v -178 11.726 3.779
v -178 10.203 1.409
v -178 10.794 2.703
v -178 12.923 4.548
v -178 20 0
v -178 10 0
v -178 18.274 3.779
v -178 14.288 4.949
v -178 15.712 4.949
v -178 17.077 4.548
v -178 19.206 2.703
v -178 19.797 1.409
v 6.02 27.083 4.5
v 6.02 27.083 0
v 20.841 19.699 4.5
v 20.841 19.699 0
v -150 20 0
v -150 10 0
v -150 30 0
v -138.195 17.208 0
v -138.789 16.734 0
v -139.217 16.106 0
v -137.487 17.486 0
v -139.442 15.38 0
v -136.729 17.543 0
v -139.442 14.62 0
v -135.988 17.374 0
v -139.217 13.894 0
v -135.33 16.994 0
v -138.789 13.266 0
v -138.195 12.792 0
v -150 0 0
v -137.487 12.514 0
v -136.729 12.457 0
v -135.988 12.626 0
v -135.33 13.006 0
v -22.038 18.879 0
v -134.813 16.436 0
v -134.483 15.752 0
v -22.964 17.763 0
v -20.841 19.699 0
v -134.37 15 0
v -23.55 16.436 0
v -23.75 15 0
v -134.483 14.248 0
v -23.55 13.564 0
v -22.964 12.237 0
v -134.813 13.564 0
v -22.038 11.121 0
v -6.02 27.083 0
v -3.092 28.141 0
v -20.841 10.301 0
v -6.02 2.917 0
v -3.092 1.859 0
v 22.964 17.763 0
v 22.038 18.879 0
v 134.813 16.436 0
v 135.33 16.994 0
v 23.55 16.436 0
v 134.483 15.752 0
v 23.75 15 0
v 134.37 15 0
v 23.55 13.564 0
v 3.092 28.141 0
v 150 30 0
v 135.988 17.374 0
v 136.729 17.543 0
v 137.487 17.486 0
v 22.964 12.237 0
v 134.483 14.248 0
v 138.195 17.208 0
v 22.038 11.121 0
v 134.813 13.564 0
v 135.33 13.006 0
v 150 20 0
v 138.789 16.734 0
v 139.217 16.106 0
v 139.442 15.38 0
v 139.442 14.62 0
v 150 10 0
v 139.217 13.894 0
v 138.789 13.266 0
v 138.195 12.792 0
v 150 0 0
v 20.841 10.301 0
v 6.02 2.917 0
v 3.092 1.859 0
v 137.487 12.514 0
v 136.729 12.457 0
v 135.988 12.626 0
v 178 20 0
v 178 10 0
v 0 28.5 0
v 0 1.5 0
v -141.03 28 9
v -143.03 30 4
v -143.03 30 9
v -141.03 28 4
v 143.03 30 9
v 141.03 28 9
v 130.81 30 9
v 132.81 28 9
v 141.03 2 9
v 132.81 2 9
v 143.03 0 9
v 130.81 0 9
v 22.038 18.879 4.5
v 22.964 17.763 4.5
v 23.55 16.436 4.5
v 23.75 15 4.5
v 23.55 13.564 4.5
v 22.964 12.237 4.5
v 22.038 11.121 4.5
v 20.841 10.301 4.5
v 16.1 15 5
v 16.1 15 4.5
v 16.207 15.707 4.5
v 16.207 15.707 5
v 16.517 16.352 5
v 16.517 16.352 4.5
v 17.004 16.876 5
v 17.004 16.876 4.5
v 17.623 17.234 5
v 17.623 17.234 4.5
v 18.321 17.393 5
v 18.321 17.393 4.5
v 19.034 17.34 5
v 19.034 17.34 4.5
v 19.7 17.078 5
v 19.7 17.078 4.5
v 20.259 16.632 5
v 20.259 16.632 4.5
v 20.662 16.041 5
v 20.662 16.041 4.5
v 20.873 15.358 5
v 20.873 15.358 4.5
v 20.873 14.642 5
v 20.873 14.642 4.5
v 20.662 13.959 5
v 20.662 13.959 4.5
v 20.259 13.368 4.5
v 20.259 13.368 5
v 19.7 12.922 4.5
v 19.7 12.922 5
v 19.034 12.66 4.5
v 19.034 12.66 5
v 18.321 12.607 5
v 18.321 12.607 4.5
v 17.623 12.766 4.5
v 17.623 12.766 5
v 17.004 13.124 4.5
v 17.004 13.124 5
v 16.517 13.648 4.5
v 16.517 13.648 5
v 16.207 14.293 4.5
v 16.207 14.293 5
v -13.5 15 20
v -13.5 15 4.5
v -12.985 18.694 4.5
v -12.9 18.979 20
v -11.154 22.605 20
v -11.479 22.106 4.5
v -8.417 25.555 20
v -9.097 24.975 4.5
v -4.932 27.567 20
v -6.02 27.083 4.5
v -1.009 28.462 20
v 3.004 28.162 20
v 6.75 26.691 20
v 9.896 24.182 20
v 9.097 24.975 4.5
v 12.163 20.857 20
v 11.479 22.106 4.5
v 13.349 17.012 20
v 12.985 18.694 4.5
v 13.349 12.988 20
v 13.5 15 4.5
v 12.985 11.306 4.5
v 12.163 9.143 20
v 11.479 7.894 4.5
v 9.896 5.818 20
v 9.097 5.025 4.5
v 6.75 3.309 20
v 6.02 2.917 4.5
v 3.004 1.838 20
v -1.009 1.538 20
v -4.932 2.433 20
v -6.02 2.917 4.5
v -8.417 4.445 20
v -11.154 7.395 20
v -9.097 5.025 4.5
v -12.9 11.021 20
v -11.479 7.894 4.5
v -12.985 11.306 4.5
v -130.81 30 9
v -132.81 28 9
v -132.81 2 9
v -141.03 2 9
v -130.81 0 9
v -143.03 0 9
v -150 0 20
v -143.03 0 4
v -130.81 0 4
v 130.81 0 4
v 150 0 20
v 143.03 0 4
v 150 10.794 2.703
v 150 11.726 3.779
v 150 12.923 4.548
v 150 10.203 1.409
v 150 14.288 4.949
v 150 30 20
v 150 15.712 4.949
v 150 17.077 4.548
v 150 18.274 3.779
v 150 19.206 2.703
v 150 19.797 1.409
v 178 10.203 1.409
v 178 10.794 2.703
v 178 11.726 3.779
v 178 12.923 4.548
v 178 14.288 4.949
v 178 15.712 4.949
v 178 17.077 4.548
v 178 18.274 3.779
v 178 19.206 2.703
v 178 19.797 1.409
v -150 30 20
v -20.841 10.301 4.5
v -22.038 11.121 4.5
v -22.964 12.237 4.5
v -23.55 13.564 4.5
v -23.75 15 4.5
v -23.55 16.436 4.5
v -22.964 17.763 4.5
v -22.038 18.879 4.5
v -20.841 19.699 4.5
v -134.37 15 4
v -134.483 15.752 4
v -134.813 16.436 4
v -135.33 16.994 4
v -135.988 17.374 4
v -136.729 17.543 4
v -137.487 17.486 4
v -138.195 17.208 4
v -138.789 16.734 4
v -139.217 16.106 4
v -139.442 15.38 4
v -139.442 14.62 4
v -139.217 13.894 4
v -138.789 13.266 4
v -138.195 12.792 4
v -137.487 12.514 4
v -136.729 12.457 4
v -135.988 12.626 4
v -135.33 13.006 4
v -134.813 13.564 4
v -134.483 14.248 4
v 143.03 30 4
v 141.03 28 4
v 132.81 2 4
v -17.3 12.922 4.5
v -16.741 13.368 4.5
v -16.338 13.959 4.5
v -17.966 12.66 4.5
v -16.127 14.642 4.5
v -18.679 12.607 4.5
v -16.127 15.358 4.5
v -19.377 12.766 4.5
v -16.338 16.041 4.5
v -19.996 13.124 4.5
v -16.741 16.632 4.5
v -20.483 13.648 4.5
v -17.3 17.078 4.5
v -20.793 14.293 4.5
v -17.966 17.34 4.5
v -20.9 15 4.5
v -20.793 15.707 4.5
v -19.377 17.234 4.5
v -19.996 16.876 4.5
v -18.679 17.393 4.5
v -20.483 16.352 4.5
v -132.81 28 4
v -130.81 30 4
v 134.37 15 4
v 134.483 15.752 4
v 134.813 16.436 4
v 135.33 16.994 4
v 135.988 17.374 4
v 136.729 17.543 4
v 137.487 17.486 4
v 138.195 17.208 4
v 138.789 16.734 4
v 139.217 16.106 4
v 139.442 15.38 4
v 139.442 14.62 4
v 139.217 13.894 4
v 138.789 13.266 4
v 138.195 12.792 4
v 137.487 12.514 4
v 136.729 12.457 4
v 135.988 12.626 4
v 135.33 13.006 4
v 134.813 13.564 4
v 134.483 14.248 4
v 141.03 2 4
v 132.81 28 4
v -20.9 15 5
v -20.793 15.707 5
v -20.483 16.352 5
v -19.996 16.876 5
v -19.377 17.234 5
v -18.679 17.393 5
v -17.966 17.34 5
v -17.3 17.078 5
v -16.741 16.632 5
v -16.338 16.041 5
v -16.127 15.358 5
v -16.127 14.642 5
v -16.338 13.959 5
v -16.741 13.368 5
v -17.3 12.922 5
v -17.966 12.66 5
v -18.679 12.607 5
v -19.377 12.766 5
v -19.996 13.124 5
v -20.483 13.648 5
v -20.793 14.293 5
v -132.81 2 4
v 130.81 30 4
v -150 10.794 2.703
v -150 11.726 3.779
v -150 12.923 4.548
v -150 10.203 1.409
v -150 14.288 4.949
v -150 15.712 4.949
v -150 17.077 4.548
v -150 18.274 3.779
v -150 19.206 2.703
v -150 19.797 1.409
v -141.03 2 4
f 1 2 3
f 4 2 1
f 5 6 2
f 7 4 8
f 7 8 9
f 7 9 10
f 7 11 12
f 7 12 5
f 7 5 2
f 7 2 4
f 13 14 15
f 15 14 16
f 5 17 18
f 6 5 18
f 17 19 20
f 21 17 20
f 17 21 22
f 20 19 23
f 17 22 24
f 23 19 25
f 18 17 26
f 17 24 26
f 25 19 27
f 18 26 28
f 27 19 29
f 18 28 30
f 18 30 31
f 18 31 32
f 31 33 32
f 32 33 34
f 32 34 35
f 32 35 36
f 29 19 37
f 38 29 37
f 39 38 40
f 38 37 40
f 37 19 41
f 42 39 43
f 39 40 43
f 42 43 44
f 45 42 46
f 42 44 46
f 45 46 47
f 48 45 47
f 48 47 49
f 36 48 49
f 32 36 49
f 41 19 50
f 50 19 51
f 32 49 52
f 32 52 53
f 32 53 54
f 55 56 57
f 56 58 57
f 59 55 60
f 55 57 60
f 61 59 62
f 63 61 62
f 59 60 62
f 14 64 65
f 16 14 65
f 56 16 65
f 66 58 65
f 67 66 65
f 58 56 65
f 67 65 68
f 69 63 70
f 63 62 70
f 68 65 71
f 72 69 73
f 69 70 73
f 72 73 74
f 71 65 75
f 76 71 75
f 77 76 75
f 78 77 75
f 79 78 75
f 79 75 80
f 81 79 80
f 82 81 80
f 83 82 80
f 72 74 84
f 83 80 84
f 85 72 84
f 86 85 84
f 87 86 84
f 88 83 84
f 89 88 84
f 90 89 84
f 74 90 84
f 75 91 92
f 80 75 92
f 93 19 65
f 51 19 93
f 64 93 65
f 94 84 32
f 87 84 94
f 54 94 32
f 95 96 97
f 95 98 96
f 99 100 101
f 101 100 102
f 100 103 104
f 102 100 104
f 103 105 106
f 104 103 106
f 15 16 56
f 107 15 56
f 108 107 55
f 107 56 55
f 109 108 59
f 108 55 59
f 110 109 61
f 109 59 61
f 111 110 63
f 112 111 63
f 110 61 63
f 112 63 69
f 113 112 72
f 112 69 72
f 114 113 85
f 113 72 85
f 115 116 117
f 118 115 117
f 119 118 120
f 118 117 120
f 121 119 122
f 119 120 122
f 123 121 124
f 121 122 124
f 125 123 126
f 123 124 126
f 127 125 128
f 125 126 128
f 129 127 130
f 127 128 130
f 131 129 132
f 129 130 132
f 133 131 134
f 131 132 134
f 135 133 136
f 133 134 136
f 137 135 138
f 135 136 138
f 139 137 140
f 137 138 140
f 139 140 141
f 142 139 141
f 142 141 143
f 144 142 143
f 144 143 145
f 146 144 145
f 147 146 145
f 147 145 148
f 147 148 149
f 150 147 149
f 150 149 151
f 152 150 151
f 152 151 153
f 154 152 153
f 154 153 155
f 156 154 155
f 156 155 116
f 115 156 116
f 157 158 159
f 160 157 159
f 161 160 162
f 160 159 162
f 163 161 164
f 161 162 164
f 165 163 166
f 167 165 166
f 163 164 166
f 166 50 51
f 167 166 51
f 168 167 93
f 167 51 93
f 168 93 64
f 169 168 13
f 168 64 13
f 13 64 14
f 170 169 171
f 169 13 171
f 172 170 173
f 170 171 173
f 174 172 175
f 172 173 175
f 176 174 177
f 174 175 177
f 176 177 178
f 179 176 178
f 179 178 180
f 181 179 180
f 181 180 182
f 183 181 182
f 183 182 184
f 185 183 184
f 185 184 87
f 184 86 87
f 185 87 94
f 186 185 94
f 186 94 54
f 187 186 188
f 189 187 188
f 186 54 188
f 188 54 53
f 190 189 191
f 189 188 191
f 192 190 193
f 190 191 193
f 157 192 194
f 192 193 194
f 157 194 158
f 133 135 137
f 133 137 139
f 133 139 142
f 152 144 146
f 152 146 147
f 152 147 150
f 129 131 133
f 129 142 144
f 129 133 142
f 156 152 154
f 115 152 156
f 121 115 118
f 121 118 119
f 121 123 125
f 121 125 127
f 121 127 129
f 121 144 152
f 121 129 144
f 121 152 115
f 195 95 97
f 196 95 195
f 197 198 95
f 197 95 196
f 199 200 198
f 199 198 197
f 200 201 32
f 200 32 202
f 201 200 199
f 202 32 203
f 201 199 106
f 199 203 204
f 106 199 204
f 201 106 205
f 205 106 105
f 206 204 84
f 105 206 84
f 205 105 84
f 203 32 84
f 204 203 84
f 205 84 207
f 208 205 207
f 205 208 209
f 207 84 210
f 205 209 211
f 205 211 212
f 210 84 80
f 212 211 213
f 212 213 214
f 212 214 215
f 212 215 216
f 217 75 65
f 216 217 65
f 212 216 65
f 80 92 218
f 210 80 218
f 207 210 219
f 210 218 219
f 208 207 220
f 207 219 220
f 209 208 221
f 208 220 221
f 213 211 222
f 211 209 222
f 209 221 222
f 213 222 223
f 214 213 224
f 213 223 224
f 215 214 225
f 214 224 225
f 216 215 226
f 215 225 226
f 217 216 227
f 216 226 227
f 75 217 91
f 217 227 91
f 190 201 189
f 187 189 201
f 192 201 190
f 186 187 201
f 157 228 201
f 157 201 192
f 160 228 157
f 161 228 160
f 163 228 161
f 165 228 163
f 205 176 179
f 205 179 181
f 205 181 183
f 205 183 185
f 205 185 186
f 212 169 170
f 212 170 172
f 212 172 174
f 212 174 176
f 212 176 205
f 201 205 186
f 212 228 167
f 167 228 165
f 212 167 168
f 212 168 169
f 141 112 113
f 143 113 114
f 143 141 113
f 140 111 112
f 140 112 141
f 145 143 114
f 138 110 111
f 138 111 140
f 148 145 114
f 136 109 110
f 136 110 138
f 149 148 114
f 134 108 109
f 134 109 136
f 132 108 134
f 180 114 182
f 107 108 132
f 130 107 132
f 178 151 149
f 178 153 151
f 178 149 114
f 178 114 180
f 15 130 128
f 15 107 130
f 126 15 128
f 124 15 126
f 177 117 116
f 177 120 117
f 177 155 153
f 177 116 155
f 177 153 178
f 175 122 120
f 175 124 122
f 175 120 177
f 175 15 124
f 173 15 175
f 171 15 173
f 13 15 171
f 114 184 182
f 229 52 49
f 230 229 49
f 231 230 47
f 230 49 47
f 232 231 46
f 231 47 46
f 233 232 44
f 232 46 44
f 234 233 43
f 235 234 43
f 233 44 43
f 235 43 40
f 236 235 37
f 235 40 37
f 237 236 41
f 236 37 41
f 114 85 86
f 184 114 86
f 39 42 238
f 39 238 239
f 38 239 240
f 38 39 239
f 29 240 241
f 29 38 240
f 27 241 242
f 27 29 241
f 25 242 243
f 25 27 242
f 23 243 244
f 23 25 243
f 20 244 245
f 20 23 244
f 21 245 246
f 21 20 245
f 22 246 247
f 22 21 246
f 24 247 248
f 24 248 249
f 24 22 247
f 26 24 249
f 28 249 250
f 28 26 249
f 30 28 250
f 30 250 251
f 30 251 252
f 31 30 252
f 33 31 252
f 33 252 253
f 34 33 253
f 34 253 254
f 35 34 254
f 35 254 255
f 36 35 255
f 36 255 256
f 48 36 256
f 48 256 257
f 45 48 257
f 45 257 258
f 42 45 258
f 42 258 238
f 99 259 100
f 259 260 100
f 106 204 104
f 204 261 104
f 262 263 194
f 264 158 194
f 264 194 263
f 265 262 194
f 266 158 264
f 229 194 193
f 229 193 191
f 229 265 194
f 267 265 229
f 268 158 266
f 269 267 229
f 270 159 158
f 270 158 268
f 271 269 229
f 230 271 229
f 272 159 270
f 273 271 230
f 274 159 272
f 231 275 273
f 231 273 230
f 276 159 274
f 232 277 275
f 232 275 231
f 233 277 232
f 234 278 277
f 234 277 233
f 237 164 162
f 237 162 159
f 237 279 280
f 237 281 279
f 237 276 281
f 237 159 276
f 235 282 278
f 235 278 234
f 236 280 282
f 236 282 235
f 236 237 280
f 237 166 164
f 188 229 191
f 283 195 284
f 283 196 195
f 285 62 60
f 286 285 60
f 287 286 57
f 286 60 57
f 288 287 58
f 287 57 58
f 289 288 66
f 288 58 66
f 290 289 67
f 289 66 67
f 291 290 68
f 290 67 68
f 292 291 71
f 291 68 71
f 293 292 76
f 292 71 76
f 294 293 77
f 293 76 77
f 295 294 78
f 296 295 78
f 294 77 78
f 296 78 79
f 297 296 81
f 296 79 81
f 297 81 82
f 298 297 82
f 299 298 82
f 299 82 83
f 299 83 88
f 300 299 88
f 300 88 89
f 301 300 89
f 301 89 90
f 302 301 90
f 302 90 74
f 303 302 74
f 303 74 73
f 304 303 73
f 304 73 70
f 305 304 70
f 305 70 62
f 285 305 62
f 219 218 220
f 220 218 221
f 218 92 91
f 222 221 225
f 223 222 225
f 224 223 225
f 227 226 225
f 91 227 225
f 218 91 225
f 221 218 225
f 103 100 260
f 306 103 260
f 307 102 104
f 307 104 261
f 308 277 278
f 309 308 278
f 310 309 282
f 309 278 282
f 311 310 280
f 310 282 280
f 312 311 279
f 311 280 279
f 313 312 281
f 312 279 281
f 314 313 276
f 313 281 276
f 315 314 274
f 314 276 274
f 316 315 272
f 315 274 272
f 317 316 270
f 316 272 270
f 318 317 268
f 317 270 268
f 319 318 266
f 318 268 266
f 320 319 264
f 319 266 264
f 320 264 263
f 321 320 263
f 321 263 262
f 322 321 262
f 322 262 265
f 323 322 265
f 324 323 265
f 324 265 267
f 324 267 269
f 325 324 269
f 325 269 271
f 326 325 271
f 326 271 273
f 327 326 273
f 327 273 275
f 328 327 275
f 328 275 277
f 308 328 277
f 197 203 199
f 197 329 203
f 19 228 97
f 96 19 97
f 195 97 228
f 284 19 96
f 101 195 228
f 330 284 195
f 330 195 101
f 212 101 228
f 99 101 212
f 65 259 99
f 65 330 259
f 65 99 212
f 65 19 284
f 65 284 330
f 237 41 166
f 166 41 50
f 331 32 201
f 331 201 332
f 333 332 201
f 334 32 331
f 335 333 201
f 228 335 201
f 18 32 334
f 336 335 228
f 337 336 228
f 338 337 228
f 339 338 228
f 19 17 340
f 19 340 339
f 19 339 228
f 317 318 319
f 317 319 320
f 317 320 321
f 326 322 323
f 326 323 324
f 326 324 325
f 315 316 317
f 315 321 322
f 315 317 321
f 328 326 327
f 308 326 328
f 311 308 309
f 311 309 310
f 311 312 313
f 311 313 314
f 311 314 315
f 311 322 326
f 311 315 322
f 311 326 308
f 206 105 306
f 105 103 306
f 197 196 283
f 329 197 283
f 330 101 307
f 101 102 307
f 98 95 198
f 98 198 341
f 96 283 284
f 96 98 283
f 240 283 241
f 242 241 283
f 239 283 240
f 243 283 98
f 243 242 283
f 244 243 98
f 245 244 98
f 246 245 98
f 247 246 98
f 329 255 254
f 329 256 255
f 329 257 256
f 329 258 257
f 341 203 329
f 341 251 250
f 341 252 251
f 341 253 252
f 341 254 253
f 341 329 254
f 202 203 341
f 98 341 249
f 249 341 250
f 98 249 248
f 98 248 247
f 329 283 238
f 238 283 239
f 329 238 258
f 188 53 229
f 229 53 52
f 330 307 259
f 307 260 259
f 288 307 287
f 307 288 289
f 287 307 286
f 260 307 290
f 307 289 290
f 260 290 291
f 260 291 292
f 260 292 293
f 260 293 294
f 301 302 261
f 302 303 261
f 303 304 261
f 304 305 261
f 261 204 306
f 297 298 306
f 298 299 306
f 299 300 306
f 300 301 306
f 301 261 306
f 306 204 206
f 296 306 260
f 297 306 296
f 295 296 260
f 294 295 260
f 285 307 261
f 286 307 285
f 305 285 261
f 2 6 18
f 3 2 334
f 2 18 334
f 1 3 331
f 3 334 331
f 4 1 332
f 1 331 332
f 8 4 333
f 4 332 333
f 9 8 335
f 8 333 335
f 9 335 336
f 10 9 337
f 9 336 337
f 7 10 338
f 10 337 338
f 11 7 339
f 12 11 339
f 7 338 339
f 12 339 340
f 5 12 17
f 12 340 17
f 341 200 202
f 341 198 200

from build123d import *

# Parameters (mm, degrees)
SKETCH_1_W           = 300
SKETCH_1_H           = 30
EXTRUDE_1_DEPTH      = 20
EXTRUDE_2_DEPTH      = 28
EXTRUDE_2_DEPTH_BACK = 328
SKETCH_3_R           = 4
CUT_EXTRUDE_1_DEPTH  = 182.614977356
SKETCH_3_3_R         = 6
SKETCH_3_3_R_2       = 4
CUT_EXTRUDE_2_DEPTH  = 182.614977356
SKETCH_3_4_R         = 13.5
SKETCH_3_4_R_2       = 6
CUT_EXTRUDE_3_DEPTH  = 182.614977356
SKETCH_3_5_R         = 2.4
CUT_EXTRUDE_4_DEPTH  = 4.5
SKETCH_3_6_R         = 2.4
CUT_EXTRUDE_5_DEPTH  = 5
SKETCH_9_W           = 8.22
SKETCH_9_H           = 5
CUT_EXTRUDE_6_DEPTH  = 182.295339172
CUT_EXTRUDE_7_REACH  = 183.615
SKETCH_11_R          = 2.55


with BuildPart() as part:
    # 草图1 → 凸台-拉伸1 (new body)
    with BuildSketch(Plane.XY):
        with Locations((0, 15)):
            Rectangle(SKETCH_1_W, SKETCH_1_H)
    extrude(amount=EXTRUDE_1_DEPTH)

    # 草图2 → 凸台-拉伸2 (add, two sides: drawn at the far end of the back side and taken through both)
    with BuildSketch(Plane.ZY.offset(150).offset(-EXTRUDE_2_DEPTH_BACK)):
        with BuildLine():
            Line((0, 20), (0, 10))
            ThreePointArc((0, 10), (5, 15), (0, 20))
        make_face()
    extrude(amount=EXTRUDE_2_DEPTH + EXTRUDE_2_DEPTH_BACK)

    # 草图3 → 切除-拉伸1 (cut, through all)
    with BuildSketch(Plane(origin=(0, 0, 0), x_dir=(-1, 0, 0), z_dir=(0, 0, -1))):
        with Locations((0, 15)):
            Circle(SKETCH_3_R)
    extrude(amount=-CUT_EXTRUDE_1_DEPTH, mode=Mode.SUBTRACT)

    # 草图3<3> → 切除-拉伸2 (cut, through all)
    with BuildSketch(Plane(origin=(0, 0, 0), x_dir=(-1, 0, 0), z_dir=(0, 0, -1))):
        with Locations((0, 15)):
            Circle(SKETCH_3_3_R)
        with Locations((0, 15)):
            Circle(SKETCH_3_3_R_2, mode=Mode.SUBTRACT)
    extrude(amount=-CUT_EXTRUDE_2_DEPTH, mode=Mode.SUBTRACT)

    # 草图3<4> → 切除-拉伸3 (cut, through all)
    with BuildSketch(Plane(origin=(0, 0, 0), x_dir=(-1, 0, 0), z_dir=(0, 0, -1))):
        with Locations((0, 15)):
            Circle(SKETCH_3_4_R)
        with Locations((0, 15)):
            Circle(SKETCH_3_4_R_2, mode=Mode.SUBTRACT)
    extrude(amount=-CUT_EXTRUDE_3_DEPTH, mode=Mode.SUBTRACT)

    # 草图3<5> → 切除-拉伸4 (cut)
    # profile 1 of 2: a face of its own
    with BuildSketch(Plane(origin=(0, 0, 0), x_dir=(-1, 0, 0), z_dir=(0, 0, -1))):
        with BuildLine():
            ThreePointArc((-6.02027027, 2.916691435), (-13.5, 15), (-6.02027027, 27.083308565))
            Line((-6.02027027, 27.083308565), (-20.841216216, 19.699064442))
            ThreePointArc((-20.841216216, 19.699064442), (-23.75, 15), (-20.841216216, 10.300935558))
            Line((-20.841216216, 10.300935558), (-6.02027027, 2.916691435))
        make_face()
        with Locations((-18.5, 15)):
            Circle(SKETCH_3_5_R, mode=Mode.SUBTRACT)
    # profile 2 of 2: a face of its own
    with BuildSketch(Plane(origin=(0, 0, 0), x_dir=(-1, 0, 0), z_dir=(0, 0, -1))):
        with BuildLine():
            Line((20.841216216, 19.699064442), (6.02027027, 27.083308565))
            ThreePointArc((6.02027027, 27.083308565), (13.5, 15), (6.02027027, 2.916691435))
            Line((6.02027027, 2.916691435), (20.841216216, 10.300935558))
            ThreePointArc((20.841216216, 10.300935558), (23.75, 15), (20.841216216, 19.699064442))
        make_face()
        with Locations((18.5, 15)):
            Circle(SKETCH_3_5_R, mode=Mode.SUBTRACT)
    extrude(amount=-CUT_EXTRUDE_4_DEPTH, mode=Mode.SUBTRACT)

    # 草图3<6> → 切除-拉伸5 (cut)
    with BuildSketch(Plane(origin=(0, 0, 0), x_dir=(-1, 0, 0), z_dir=(0, 0, -1))):
        with Locations((18.5, 15)):
            Circle(SKETCH_3_6_R)
        with Locations((-18.5, 15)):
            Circle(SKETCH_3_6_R)
    extrude(amount=-CUT_EXTRUDE_5_DEPTH, mode=Mode.SUBTRACT)

    # 草图6 → 切除-放样2 section 0
    with BuildSketch(Plane.XZ):
        with BuildLine():
            Line((-143.03, 4), (-130.81, 4))
            Line((-130.81, 4), (-130.81, 9))
            Line((-130.81, 9), (-143.03, 9))
            Line((-143.03, 9), (-143.03, 4))
        make_face()
    # 草图7 → 切除-放样2 section 1
    with BuildSketch(Plane(origin=(0, 2, 0), x_dir=(-1, 0, 0), z_dir=(0, -1, 0))):
        with BuildLine():
            Line((132.81, -9), (141.03, -9))
            Line((141.03, -9), (141.03, -4))
            Line((141.03, -4), (132.81, -4))
            Line((132.81, -4), (132.81, -9))
        make_face()
    loft_2 = loft(mode=Mode.SUBTRACT)

    # 草图4 → 切除-放样3 section 0
    with BuildSketch(Plane(origin=(0, 30, 0), x_dir=(1, 0, 0), z_dir=(0, 1, 0))):
        with BuildLine():
            Line((-143.03, -9), (-130.81, -9))
            Line((-130.81, -9), (-130.81, -4))
            Line((-130.81, -4), (-143.03, -4))
            Line((-143.03, -4), (-143.03, -9))
        make_face()
    # 草图5 → 切除-放样3 section 1
    with BuildSketch(Plane(origin=(0, 28, 0), x_dir=(1, 0, 0), z_dir=(0, 1, 0))):
        with BuildLine():
            Line((-141.03, -9), (-132.81, -9))
            Line((-132.81, -9), (-132.81, -4))
            Line((-132.81, -4), (-141.03, -4))
            Line((-141.03, -4), (-141.03, -9))
        make_face()
    loft_3 = loft(mode=Mode.SUBTRACT)

    # 草图9 → 切除-拉伸6 (cut, through all)
    with BuildSketch(Plane(origin=(0, 28, 0), x_dir=(1, 0, 0), z_dir=(0, 1, 0))):
        with Locations((-136.92, -6.5)):
            Rectangle(SKETCH_9_W, SKETCH_9_H)
    cut_extrude_6 = extrude(amount=-CUT_EXTRUDE_6_DEPTH, mode=Mode.SUBTRACT)

    # 镜向2: 切除-放样2, 切除-放样3, 切除-拉伸6 across plane
    add(loft_2.mirror(Plane(origin=(0, 0, 0), x_dir=(0, 0, 1), z_dir=(1, 0, 0))), mode=Mode.SUBTRACT)
    add(loft_3.mirror(Plane(origin=(0, 0, 0), x_dir=(0, 0, 1), z_dir=(1, 0, 0))), mode=Mode.SUBTRACT)
    add(cut_extrude_6.mirror(Plane(origin=(0, 0, 0), x_dir=(0, 0, 1), z_dir=(1, 0, 0))), mode=Mode.SUBTRACT)

    # 草图11 → 切除-拉伸7 (cut, up to next)
    with BuildSketch(Plane(origin=(0, 0, 0), x_dir=(-1, 0, 0), z_dir=(0, 0, -1)), mode=Mode.PRIVATE) as cut_extrude_7_sk1:
        with Locations((-136.92, 15)):
            Circle(SKETCH_11_R)
    cut_extrude_7_tool1 = extrude(cut_extrude_7_sk1.sketch, amount=-CUT_EXTRUDE_7_REACH, mode=Mode.PRIVATE) & part.part
    cut_extrude_7 = cut_extrude_7_tool1.solids().sort_by_distance((136.92, 15, 0))[0]
    add(cut_extrude_7, mode=Mode.SUBTRACT)

    # 镜向3: 切除-拉伸7 across plane
    add(cut_extrude_7.mirror(Plane(origin=(0, 0, 0), x_dir=(0, 0, 1), z_dir=(1, 0, 0))), mode=Mode.SUBTRACT)


solid = part.part
